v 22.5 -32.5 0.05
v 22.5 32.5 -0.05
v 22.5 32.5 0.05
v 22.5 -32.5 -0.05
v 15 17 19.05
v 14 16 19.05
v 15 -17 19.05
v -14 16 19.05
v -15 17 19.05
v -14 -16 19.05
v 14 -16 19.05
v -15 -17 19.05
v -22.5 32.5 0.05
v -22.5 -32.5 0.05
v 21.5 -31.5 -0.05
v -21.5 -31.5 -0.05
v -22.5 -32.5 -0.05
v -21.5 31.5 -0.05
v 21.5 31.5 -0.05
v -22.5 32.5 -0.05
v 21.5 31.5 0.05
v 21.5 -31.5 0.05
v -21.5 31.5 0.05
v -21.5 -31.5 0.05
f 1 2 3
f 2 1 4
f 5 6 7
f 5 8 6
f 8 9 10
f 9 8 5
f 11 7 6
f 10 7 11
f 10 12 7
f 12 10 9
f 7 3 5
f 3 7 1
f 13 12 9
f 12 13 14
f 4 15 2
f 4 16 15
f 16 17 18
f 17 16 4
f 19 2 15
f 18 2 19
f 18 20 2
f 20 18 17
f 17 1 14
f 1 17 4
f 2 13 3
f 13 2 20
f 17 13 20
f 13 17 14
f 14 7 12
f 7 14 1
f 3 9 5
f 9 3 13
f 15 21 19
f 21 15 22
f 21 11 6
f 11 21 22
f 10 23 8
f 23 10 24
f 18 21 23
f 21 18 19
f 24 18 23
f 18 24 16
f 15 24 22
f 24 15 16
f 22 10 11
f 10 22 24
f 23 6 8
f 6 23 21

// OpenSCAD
//	Height of trapazoid
height = 19;

//	Width of top cube
top_x = 30;
//	Length of top cube
top_y = 34;

//	Width of bottom cube
bottom_x = 45;
//	Length of bottom cube
bottom_y = 65;

wall_thickness = 2;

module trap_cube() {
	difference(){
		hull(){
			translate([0,0,height])
				cube([top_x, top_y, 0.1], center=true);
				cube([bottom_x, bottom_y, 0.1], center=true);
			}

		hull(){
			translate([0,0,height])
				cube([top_x - wall_thickness, top_y - wall_thickness, 0.1], center=true);
				cube([bottom_x - wall_thickness, bottom_y - wall_thickness, 0.1], center=true);
		}
	}
}

trap_cube();
